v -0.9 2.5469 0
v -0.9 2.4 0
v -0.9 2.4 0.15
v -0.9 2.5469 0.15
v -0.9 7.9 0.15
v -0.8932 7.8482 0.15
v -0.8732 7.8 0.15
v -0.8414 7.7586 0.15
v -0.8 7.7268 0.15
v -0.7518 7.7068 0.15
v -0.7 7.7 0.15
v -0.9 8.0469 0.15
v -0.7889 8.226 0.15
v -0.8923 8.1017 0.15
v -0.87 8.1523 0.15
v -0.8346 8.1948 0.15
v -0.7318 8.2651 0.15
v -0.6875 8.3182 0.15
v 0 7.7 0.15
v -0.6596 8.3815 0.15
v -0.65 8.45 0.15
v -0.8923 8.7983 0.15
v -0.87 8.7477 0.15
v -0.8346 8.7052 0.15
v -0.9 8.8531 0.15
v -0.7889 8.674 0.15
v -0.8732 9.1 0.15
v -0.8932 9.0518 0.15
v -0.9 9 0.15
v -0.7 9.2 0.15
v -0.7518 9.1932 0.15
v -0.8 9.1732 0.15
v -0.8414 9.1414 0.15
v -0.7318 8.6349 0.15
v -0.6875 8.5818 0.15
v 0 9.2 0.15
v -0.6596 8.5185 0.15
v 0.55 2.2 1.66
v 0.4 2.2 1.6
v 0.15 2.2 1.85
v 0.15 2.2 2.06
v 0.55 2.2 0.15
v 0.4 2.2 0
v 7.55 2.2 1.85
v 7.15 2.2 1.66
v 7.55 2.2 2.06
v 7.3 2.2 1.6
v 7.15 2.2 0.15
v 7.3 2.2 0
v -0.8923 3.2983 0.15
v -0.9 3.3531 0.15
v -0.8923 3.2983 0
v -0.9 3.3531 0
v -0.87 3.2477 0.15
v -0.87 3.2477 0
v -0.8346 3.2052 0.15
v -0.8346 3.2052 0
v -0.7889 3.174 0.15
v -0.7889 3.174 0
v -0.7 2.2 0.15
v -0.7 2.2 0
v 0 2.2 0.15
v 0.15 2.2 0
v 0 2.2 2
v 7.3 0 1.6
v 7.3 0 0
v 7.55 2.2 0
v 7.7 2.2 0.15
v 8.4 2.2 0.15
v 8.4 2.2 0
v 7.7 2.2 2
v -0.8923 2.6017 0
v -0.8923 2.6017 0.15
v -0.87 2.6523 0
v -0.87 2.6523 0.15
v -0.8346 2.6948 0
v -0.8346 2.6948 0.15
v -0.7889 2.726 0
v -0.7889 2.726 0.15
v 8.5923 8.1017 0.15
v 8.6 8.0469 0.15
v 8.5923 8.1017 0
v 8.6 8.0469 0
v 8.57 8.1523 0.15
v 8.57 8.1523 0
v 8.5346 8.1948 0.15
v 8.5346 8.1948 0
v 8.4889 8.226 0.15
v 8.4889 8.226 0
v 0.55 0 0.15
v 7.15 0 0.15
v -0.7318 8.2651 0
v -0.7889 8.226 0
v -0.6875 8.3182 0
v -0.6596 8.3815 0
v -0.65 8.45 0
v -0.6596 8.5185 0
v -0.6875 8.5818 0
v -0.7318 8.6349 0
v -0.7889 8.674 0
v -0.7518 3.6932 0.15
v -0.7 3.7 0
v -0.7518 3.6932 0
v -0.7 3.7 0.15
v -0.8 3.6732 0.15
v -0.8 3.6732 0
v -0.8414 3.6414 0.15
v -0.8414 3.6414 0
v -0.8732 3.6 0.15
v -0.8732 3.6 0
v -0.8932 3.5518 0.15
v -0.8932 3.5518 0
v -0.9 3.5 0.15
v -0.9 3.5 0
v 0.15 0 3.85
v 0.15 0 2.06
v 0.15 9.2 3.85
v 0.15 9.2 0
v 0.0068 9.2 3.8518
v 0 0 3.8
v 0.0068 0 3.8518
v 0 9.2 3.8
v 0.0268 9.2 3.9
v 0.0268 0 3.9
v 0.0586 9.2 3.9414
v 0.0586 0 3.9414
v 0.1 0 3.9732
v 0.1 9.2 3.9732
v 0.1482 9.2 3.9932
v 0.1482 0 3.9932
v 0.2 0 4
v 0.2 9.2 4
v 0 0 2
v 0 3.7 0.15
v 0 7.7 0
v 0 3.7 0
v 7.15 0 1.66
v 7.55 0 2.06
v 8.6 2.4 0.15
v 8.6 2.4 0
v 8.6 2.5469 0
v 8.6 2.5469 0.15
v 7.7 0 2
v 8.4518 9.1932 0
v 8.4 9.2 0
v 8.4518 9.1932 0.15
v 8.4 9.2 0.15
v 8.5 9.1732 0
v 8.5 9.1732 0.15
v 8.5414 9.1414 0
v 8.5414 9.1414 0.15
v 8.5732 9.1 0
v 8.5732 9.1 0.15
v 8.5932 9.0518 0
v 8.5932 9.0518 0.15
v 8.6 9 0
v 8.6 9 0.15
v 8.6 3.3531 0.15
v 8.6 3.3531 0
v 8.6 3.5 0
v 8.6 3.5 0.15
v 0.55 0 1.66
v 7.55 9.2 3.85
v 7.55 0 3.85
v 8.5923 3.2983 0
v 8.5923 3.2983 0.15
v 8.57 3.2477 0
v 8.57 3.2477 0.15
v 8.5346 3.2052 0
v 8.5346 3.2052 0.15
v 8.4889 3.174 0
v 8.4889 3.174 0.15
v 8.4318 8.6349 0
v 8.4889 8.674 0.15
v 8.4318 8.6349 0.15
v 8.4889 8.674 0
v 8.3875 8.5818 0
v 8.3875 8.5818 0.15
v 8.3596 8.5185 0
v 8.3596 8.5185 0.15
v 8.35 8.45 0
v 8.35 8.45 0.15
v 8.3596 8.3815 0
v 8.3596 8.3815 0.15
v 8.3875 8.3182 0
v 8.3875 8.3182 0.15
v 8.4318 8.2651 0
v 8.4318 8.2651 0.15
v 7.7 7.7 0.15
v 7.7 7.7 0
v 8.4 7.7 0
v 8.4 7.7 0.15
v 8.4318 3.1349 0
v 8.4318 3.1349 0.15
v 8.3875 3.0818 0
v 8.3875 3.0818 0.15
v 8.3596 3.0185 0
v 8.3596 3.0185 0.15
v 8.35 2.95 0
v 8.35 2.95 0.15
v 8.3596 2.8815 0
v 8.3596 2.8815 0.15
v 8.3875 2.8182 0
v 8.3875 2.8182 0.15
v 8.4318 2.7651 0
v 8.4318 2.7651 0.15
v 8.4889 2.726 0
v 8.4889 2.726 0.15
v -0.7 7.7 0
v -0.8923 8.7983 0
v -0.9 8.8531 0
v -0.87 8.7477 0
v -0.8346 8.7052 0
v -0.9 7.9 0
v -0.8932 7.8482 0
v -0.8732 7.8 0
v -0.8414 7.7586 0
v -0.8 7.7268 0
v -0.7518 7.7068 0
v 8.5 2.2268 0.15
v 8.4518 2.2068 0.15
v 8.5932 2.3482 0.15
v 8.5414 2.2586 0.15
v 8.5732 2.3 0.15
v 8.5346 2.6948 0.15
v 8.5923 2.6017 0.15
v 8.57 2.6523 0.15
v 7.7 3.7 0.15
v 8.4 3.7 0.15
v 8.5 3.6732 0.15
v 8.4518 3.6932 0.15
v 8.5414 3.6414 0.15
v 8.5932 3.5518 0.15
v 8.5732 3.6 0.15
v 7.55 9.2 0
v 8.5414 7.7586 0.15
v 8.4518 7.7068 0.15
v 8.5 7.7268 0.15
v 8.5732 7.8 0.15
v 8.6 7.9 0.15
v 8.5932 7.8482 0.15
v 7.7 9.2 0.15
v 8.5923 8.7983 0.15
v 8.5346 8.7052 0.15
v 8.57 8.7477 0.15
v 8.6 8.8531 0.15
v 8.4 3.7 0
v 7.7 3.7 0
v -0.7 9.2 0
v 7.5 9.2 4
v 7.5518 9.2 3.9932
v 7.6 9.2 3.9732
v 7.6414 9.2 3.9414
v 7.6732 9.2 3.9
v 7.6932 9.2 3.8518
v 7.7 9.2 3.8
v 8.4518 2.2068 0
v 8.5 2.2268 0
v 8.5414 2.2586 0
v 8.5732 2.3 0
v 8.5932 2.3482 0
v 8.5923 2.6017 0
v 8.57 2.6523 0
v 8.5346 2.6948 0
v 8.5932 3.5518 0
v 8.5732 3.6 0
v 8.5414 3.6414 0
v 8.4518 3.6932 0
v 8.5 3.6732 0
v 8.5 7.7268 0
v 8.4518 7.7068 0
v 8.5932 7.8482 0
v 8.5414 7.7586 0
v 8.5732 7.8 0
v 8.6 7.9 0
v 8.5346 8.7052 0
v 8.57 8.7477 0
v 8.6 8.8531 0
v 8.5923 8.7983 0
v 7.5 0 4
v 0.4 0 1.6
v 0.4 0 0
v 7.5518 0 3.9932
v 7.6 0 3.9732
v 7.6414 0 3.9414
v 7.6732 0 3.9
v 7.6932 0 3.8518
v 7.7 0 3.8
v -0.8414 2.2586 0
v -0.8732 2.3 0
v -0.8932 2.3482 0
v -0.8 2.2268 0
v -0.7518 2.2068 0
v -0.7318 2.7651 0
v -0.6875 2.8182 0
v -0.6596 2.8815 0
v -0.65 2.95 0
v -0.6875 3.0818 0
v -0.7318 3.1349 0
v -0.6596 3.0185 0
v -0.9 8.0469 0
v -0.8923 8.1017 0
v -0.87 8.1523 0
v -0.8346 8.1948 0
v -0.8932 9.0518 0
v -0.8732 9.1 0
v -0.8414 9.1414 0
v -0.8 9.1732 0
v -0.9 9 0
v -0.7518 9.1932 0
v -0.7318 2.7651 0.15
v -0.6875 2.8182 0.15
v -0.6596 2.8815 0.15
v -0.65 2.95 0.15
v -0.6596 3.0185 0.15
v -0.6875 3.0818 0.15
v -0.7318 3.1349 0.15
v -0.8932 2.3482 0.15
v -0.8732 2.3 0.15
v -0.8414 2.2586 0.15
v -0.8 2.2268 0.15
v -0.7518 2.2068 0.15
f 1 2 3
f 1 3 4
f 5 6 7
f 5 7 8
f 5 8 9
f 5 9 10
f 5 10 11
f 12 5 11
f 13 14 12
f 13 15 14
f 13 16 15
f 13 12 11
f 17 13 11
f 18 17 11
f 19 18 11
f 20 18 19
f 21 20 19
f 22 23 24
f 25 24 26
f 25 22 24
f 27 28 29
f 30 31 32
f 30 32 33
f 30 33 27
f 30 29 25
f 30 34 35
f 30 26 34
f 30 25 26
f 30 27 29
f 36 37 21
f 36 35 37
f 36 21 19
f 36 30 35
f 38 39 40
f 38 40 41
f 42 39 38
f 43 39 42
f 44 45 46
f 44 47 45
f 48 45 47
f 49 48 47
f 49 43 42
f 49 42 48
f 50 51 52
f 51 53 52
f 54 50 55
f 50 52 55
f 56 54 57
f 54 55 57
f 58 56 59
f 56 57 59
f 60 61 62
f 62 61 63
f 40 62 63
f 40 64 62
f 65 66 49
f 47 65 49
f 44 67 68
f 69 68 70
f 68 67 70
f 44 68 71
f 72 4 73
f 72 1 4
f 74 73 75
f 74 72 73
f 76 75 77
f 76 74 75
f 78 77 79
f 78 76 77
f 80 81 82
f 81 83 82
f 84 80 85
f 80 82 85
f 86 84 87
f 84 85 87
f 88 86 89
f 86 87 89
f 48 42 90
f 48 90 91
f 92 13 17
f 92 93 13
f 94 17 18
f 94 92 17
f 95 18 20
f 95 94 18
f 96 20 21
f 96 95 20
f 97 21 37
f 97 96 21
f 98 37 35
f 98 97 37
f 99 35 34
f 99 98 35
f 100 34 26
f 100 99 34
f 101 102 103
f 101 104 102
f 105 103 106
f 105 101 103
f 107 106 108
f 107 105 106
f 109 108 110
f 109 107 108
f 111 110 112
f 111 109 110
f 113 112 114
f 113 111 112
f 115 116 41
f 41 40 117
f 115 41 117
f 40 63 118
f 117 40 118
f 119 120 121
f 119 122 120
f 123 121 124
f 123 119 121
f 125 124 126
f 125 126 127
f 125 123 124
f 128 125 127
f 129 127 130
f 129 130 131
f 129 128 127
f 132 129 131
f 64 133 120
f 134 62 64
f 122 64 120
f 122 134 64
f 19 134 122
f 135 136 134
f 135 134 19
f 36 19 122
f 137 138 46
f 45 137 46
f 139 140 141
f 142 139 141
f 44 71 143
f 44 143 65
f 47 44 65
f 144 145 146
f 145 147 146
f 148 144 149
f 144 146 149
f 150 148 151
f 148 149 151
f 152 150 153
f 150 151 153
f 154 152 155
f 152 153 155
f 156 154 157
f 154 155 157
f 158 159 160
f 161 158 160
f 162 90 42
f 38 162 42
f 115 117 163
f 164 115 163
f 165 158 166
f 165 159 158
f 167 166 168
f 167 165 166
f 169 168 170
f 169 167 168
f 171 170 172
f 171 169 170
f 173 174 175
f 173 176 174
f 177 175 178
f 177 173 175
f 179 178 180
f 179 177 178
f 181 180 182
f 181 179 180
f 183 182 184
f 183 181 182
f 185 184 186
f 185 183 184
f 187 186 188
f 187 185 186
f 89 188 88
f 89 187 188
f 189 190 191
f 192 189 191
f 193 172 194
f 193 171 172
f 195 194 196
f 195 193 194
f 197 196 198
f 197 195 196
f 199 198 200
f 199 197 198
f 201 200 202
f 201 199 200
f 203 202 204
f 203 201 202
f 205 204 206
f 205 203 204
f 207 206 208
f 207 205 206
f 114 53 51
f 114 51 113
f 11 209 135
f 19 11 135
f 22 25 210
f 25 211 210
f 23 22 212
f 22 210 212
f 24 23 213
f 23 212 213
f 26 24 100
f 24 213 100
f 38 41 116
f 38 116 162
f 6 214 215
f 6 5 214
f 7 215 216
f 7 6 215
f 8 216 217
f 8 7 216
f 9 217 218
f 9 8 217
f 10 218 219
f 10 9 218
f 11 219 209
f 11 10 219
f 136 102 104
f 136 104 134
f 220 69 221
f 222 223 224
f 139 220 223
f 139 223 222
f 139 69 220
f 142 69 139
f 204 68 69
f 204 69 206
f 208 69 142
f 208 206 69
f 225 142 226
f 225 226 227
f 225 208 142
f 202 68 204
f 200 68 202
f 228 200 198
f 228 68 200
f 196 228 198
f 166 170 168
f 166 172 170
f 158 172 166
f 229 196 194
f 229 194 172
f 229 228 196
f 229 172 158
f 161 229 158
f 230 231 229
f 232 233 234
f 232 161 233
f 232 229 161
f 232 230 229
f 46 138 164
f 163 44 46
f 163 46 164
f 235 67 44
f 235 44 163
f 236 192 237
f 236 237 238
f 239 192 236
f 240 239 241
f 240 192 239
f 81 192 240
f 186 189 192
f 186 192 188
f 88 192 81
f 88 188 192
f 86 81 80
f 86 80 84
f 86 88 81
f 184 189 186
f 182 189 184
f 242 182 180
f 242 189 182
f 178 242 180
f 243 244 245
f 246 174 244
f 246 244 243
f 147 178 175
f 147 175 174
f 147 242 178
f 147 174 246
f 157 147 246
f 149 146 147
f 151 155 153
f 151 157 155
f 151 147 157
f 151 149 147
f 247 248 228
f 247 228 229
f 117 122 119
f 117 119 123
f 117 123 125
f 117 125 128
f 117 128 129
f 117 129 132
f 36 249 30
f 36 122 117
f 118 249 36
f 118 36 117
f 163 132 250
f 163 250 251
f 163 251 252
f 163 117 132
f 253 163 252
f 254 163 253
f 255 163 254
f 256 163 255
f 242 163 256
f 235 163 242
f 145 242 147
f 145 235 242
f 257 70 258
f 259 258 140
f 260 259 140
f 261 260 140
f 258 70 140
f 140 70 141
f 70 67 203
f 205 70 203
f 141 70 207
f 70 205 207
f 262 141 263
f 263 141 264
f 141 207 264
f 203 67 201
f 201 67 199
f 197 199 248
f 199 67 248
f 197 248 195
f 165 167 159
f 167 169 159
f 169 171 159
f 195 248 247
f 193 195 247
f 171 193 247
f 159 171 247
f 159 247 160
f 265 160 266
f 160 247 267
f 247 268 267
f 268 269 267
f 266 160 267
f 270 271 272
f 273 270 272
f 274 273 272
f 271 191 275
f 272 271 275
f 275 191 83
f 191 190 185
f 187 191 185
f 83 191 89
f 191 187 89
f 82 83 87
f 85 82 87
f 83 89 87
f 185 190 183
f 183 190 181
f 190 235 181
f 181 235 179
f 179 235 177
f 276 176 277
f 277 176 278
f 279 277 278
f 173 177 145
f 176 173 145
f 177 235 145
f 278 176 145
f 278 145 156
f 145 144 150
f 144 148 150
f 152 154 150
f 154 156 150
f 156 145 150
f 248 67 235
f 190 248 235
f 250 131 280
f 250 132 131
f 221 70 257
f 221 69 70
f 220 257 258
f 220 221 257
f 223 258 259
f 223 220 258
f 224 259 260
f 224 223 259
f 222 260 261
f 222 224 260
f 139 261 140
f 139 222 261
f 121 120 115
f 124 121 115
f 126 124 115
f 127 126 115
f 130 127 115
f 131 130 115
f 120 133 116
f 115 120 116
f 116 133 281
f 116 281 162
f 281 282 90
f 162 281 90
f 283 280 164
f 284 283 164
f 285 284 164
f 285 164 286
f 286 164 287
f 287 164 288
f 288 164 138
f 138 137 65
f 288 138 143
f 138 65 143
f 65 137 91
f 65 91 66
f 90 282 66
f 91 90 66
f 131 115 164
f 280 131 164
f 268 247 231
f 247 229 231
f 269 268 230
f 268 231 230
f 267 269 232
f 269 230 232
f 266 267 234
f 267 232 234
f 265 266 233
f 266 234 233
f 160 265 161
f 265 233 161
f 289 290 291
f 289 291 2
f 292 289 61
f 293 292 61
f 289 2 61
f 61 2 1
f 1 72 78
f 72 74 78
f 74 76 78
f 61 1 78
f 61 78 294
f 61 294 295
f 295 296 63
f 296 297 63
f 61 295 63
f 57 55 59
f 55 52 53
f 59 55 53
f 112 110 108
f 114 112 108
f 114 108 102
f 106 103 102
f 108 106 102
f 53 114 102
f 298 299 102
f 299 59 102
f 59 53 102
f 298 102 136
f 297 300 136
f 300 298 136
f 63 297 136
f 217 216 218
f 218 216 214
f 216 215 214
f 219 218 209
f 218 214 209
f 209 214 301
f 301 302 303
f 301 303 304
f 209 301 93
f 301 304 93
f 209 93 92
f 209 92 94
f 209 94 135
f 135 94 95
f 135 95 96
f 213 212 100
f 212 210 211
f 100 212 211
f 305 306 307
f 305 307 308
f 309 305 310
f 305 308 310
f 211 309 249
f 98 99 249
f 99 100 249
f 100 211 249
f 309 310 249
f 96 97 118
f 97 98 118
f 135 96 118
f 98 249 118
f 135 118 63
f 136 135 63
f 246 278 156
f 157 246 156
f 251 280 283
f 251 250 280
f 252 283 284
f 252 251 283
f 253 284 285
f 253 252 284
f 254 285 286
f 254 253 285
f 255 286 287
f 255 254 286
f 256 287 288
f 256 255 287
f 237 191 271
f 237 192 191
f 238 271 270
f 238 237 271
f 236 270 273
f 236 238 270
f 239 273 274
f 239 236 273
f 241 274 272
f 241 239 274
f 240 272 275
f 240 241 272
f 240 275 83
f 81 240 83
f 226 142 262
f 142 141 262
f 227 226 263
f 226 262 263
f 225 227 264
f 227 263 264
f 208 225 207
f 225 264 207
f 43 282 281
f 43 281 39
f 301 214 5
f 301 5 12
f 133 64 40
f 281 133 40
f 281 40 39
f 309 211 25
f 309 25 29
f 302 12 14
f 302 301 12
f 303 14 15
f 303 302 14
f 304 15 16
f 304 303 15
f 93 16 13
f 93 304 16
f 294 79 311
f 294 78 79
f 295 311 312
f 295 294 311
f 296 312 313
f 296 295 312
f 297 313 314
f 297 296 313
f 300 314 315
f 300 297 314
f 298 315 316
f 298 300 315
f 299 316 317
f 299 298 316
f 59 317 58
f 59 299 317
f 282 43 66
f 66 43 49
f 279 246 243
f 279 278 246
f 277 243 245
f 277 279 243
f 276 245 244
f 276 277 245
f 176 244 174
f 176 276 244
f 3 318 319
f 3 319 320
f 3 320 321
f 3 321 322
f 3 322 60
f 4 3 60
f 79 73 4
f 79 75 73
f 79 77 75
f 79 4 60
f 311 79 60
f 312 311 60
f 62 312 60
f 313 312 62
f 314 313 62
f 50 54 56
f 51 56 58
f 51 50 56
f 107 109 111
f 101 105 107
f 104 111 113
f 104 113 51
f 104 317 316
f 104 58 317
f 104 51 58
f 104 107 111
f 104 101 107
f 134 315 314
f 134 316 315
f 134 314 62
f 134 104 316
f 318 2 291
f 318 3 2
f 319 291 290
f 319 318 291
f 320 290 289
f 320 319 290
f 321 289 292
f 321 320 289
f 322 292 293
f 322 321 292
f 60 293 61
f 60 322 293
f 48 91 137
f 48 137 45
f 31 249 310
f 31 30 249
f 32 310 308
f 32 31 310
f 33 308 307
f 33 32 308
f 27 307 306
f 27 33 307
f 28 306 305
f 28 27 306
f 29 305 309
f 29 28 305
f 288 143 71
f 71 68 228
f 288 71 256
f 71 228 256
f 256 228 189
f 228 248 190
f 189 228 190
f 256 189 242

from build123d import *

# Parameters (mm, degrees)
BOX_W                  = 7.4
BOX_H                  = 7
BOX_DEPTH              = 0.2
BOX015_W               = 0.8
BOX015_H               = 9.4
BOX015_DEPTH           = 0.8
BOX015_PLACEMENT_ANGLE = 225
BOX014_W               = 0.4
BOX014_H               = 2.3
BOX014_DEPTH           = 1.91
BOX017_W               = 0.8
BOX017_H               = 9.4
BOX017_DEPTH           = 0.8
BOX017_PLACEMENT_ANGLE = 45
BOX013_W               = 0.4
BOX013_H               = 2.3
BOX013_DEPTH           = 1.91
BOX018_W               = 7.4
BOX018_H               = 9.4
BOX018_DEPTH           = 3.7
CYLINDER004_R          = 0.25
CYLINDER004_DEPTH      = 0.17
BOX024_W               = 0.9
BOX024_H               = 1.5
BOX024_DEPTH           = 0.15
FILLET006_R            = 0.2
CYLINDER006_R          = 0.25
CYLINDER006_DEPTH      = 0.17
BOX025_W               = 0.9
BOX025_H               = 1.5
BOX025_DEPTH           = 0.15
FILLET007_R            = 0.2
CYLINDER005_R          = 0.25
CYLINDER005_DEPTH      = 0.17
BOX026_W               = 0.9
BOX026_H               = 1.5
BOX026_DEPTH           = 0.15
FILLET008_R            = 0.2
CYLINDER007_R          = 0.25
CYLINDER007_DEPTH      = 0.17
BOX027_W               = 0.9
BOX027_H               = 1.5
BOX027_DEPTH           = 0.15
FILLET005_R            = 0.2
BOX023_W               = 0.8
BOX023_H               = 2.2
BOX023_DEPTH           = 0.8
BOX023_PLACEMENT_ANGLE = 45
BOX022_W               = 0.4
BOX022_H               = 2.2
BOX022_DEPTH           = 2
BOX020_W               = 0.8
BOX020_H               = 2.2
BOX020_DEPTH           = 0.8
BOX020_PLACEMENT_ANGLE = 45
BOX021_W               = 0.4
BOX021_H               = 2.2
BOX021_DEPTH           = 2
BOX019_W               = 7.7
BOX019_H               = 9.2
BOX019_DEPTH           = 4
FILLET009_R            = 0.2


with BuildPart() as cube:
    # Box → Box (new body)
    with BuildSketch(Plane(origin=(0.15, 2.2, -0.01), x_dir=(1, 0, 0), z_dir=(0, 0, 1))):
        with Locations((3.7, 3.5)):
            Rectangle(BOX_W, BOX_H)
    extrude(amount=BOX_DEPTH)


with BuildPart() as cube011:
    # Box015 → Box015 (new body)
    with BuildSketch(Plane.XY):
        with Locations((0.4, 4.7)):
            Rectangle(BOX015_W, BOX015_H)
    extrude(amount=BOX015_DEPTH)


with BuildPart() as cube011_1:
    # Box015 placement: moved
    add(cube011.part.moved(Location((7.4, -0.1, 2.06))).rotate(Axis((7.4, -0.1, 2.06), (0, 1, 0)), BOX015_PLACEMENT_ANGLE))


with BuildPart() as cut013:
    # Box014 → Box014 (new body)
    with BuildSketch(Plane(origin=(7, -0.1, 0.15), x_dir=(1, 0, 0), z_dir=(0, 0, 1))):
        with Locations((0.2, 1.15)):
            Rectangle(BOX014_W, BOX014_H)
    extrude(amount=BOX014_DEPTH)

    # Cut013: cut Cube011
    add(cube011_1.part, mode=Mode.SUBTRACT)


with BuildPart() as cut013_1:
    # Cut013 placement: moved
    add(cut013.part.moved(Location((0.15, 0, 0))))


with BuildPart() as cube013:
    # Box017 → Box017 (new body)
    with BuildSketch(Plane.XY):
        with Locations((0.4, 4.7)):
            Rectangle(BOX017_W, BOX017_H)
    extrude(amount=BOX017_DEPTH)


with BuildPart() as cube013_1:
    # Box017 placement: moved
    add(cube013.part.moved(Location((0.15, -0.1, 2.06))).rotate(Axis((0.15, -0.1, 2.06), (0, 1, 0)), BOX017_PLACEMENT_ANGLE))


with BuildPart() as cut022:
    # Box013 → Box013 (new body)
    with BuildSketch(Plane(origin=(0.15, -0.1, 0.15), x_dir=(1, 0, 0), z_dir=(0, 0, 1))):
        with Locations((0.2, 1.15)):
            Rectangle(BOX013_W, BOX013_H)
    extrude(amount=BOX013_DEPTH)

    # Cut022: cut Cube013
    add(cube013_1.part, mode=Mode.SUBTRACT)


with BuildPart() as cut024:
    # Box018 → Box018 (new body)
    with BuildSketch(Plane(origin=(0.15, -0.1, 0.15), x_dir=(1, 0, 0), z_dir=(0, 0, 1))):
        with Locations((3.7, 4.7)):
            Rectangle(BOX018_W, BOX018_H)
    extrude(amount=BOX018_DEPTH)

    # Cut023: cut Cut022
    add(cut022.part, mode=Mode.SUBTRACT)

    # Cut024: cut Cut013
    add(cut013_1.part, mode=Mode.SUBTRACT)


with BuildPart() as cylinder004:
    # Cylinder004 → Cylinder004 (new body)
    with BuildSketch(Plane(origin=(-0.9, 2.95, -0.01), x_dir=(1, 0, 0), z_dir=(0, 0, 1))):
        Circle(CYLINDER004_R)
    extrude(amount=CYLINDER004_DEPTH)


with BuildPart() as foot012:
    # Box024 → Box024 (new body)
    with BuildSketch(Plane(origin=(-0.9, 2.2, 0), x_dir=(1, 0, 0), z_dir=(0, 0, 1))):
        with Locations((0.45, 0.75)):
            Rectangle(BOX024_W, BOX024_H)
    extrude(amount=BOX024_DEPTH)

    # Cut021: cut Cylinder004
    add(cylinder004.part, mode=Mode.SUBTRACT)

    # Fillet006
    fillet006_edges = [foot012.edges().sort_by_distance(p)[0] for p in [
        (-0.9, 2.7, 0.075),
        (-0.9, 2.2, 0.075),
        (-0.9, 3.2, 0.075),
        (-0.9, 3.7, 0.075),
    ]]
    fillet(fillet006_edges, radius=FILLET006_R)


with BuildPart() as cylinder006:
    # Cylinder006 → Cylinder006 (new body)
    with BuildSketch(Plane(origin=(-0.9, 8.45, -0.01), x_dir=(1, 0, 0), z_dir=(0, 0, 1))):
        Circle(CYLINDER006_R)
    extrude(amount=CYLINDER006_DEPTH)


with BuildPart() as foot013:
    # Box025 → Box025 (new body)
    with BuildSketch(Plane(origin=(-0.9, 7.7, 0), x_dir=(1, 0, 0), z_dir=(0, 0, 1))):
        with Locations((0.45, 0.75)):
            Rectangle(BOX025_W, BOX025_H)
    extrude(amount=BOX025_DEPTH)

    # Cut016: cut Cylinder006
    add(cylinder006.part, mode=Mode.SUBTRACT)

    # Fillet007
    fillet007_edges = [foot013.edges().sort_by_distance(p)[0] for p in [
        (-0.9, 8.2, 0.075),
        (-0.9, 7.7, 0.075),
        (-0.9, 8.7, 0.075),
        (-0.9, 9.2, 0.075),
    ]]
    fillet(fillet007_edges, radius=FILLET007_R)


with BuildPart() as cylinder005:
    # Cylinder005 → Cylinder005 (new body)
    with BuildSketch(Plane(origin=(8.6, 2.95, -0.01), x_dir=(1, 0, 0), z_dir=(0, 0, 1))):
        Circle(CYLINDER005_R)
    extrude(amount=CYLINDER005_DEPTH)


with BuildPart() as foot014:
    # Box026 → Box026 (new body)
    with BuildSketch(Plane(origin=(7.7, 2.2, 0), x_dir=(1, 0, 0), z_dir=(0, 0, 1))):
        with Locations((0.45, 0.75)):
            Rectangle(BOX026_W, BOX026_H)
    extrude(amount=BOX026_DEPTH)

    # Cut014: cut Cylinder005
    add(cylinder005.part, mode=Mode.SUBTRACT)

    # Fillet008
    fillet008_edges = [foot014.edges().sort_by_distance(p)[0] for p in [
        (8.6, 2.2, 0.075),
        (8.6, 3.7, 0.075),
        (8.6, 2.7, 0.075),
        (8.6, 3.2, 0.075),
    ]]
    fillet(fillet008_edges, radius=FILLET008_R)


with BuildPart() as cylinder007:
    # Cylinder007 → Cylinder007 (new body)
    with BuildSketch(Plane(origin=(8.6, 8.45, -0.01), x_dir=(1, 0, 0), z_dir=(0, 0, 1))):
        Circle(CYLINDER007_R)
    extrude(amount=CYLINDER007_DEPTH)


with BuildPart() as foot009:
    # Box027 → Box027 (new body)
    with BuildSketch(Plane(origin=(7.7, 7.7, 0), x_dir=(1, 0, 0), z_dir=(0, 0, 1))):
        with Locations((0.45, 0.75)):
            Rectangle(BOX027_W, BOX027_H)
    extrude(amount=BOX027_DEPTH)

    # Cut015: cut Cylinder007
    add(cylinder007.part, mode=Mode.SUBTRACT)

    # Fillet005
    fillet005_edges = [foot009.edges().sort_by_distance(p)[0] for p in [
        (8.6, 7.7, 0.075),
        (8.6, 9.2, 0.075),
        (8.6, 8.2, 0.075),
        (8.6, 8.7, 0.075),
    ]]
    fillet(fillet005_edges, radius=FILLET005_R)


with BuildPart() as cube019:
    # Box023 → Box023 (new body)
    with BuildSketch(Plane.XY):
        with Locations((0.4, 1.1)):
            Rectangle(BOX023_W, BOX023_H)
    extrude(amount=BOX023_DEPTH)


with BuildPart() as cube019_1:
    # Box023 placement: moved
    add(cube019.part.moved(Location((0, 0, 2))).rotate(Axis((0, 0, 2), (0, 1, 0)), BOX023_PLACEMENT_ANGLE))


with BuildPart() as right_side_cutout001:
    # Box022 → Box022 (new body)
    with BuildSketch(Plane.XY):
        with Locations((0.2, 1.1)):
            Rectangle(BOX022_W, BOX022_H)
    extrude(amount=BOX022_DEPTH)

    # Cut018: cut Cube019
    add(cube019_1.part, mode=Mode.SUBTRACT)


with BuildPart() as right_side_cutout001_1:
    # Cut018 placement: moved
    add(right_side_cutout001.part.moved(Location((7.7, 0, 0))))


with BuildPart() as part_mirroring001:
    # Part__Mirroring001: instance of Right Side Cutout001
    add(right_side_cutout001_1.part.mirror(Plane(origin=(7.7, 0, 0), x_dir=(0, -1, 0), z_dir=(1, 0, 0))))


with BuildPart() as cube016:
    # Box020 → Box020 (new body)
    with BuildSketch(Plane.XY):
        with Locations((0.4, 1.1)):
            Rectangle(BOX020_W, BOX020_H)
    extrude(amount=BOX020_DEPTH)


with BuildPart() as cube016_1:
    # Box020 placement: moved
    add(cube016.part.moved(Location((0, 0, 2))).rotate(Axis((0, 0, 2), (0, 1, 0)), BOX020_PLACEMENT_ANGLE))


with BuildPart() as left_side_cutout001:
    # Box021 → Box021 (new body)
    with BuildSketch(Plane.XY):
        with Locations((0.2, 1.1)):
            Rectangle(BOX021_W, BOX021_H)
    extrude(amount=BOX021_DEPTH)

    # Cut020: cut Cube016
    add(cube016_1.part, mode=Mode.SUBTRACT)


with BuildPart() as metal_shell:
    # Box019 → Box019 (new body)
    with BuildSketch(Plane.XY):
        with Locations((3.85, 4.6)):
            Rectangle(BOX019_W, BOX019_H)
    extrude(amount=BOX019_DEPTH)

    # Cut019: cut Left Side Cutout001
    add(left_side_cutout001.part, mode=Mode.SUBTRACT)

    # Cut017: cut Part__Mirroring001
    add(part_mirroring001.part, mode=Mode.SUBTRACT)

    # Fillet009
    fillet009_edges = [metal_shell.edges().sort_by_distance(p)[0] for p in [
        (0, 4.6, 4),
        (7.7, 4.6, 4),
    ]]
    fillet(fillet009_edges, radius=FILLET009_R)

    # Fusion001: union Foot012, Foot013, Foot014, Foot009
    add(foot012.part)
    add(foot013.part)
    add(foot014.part)
    add(foot009.part)

    # Cut025: cut Cut024
    add(cut024.part, mode=Mode.SUBTRACT)

    # Cut: cut Cube
    add(cube.part, mode=Mode.SUBTRACT)


solid = metal_shell.part
